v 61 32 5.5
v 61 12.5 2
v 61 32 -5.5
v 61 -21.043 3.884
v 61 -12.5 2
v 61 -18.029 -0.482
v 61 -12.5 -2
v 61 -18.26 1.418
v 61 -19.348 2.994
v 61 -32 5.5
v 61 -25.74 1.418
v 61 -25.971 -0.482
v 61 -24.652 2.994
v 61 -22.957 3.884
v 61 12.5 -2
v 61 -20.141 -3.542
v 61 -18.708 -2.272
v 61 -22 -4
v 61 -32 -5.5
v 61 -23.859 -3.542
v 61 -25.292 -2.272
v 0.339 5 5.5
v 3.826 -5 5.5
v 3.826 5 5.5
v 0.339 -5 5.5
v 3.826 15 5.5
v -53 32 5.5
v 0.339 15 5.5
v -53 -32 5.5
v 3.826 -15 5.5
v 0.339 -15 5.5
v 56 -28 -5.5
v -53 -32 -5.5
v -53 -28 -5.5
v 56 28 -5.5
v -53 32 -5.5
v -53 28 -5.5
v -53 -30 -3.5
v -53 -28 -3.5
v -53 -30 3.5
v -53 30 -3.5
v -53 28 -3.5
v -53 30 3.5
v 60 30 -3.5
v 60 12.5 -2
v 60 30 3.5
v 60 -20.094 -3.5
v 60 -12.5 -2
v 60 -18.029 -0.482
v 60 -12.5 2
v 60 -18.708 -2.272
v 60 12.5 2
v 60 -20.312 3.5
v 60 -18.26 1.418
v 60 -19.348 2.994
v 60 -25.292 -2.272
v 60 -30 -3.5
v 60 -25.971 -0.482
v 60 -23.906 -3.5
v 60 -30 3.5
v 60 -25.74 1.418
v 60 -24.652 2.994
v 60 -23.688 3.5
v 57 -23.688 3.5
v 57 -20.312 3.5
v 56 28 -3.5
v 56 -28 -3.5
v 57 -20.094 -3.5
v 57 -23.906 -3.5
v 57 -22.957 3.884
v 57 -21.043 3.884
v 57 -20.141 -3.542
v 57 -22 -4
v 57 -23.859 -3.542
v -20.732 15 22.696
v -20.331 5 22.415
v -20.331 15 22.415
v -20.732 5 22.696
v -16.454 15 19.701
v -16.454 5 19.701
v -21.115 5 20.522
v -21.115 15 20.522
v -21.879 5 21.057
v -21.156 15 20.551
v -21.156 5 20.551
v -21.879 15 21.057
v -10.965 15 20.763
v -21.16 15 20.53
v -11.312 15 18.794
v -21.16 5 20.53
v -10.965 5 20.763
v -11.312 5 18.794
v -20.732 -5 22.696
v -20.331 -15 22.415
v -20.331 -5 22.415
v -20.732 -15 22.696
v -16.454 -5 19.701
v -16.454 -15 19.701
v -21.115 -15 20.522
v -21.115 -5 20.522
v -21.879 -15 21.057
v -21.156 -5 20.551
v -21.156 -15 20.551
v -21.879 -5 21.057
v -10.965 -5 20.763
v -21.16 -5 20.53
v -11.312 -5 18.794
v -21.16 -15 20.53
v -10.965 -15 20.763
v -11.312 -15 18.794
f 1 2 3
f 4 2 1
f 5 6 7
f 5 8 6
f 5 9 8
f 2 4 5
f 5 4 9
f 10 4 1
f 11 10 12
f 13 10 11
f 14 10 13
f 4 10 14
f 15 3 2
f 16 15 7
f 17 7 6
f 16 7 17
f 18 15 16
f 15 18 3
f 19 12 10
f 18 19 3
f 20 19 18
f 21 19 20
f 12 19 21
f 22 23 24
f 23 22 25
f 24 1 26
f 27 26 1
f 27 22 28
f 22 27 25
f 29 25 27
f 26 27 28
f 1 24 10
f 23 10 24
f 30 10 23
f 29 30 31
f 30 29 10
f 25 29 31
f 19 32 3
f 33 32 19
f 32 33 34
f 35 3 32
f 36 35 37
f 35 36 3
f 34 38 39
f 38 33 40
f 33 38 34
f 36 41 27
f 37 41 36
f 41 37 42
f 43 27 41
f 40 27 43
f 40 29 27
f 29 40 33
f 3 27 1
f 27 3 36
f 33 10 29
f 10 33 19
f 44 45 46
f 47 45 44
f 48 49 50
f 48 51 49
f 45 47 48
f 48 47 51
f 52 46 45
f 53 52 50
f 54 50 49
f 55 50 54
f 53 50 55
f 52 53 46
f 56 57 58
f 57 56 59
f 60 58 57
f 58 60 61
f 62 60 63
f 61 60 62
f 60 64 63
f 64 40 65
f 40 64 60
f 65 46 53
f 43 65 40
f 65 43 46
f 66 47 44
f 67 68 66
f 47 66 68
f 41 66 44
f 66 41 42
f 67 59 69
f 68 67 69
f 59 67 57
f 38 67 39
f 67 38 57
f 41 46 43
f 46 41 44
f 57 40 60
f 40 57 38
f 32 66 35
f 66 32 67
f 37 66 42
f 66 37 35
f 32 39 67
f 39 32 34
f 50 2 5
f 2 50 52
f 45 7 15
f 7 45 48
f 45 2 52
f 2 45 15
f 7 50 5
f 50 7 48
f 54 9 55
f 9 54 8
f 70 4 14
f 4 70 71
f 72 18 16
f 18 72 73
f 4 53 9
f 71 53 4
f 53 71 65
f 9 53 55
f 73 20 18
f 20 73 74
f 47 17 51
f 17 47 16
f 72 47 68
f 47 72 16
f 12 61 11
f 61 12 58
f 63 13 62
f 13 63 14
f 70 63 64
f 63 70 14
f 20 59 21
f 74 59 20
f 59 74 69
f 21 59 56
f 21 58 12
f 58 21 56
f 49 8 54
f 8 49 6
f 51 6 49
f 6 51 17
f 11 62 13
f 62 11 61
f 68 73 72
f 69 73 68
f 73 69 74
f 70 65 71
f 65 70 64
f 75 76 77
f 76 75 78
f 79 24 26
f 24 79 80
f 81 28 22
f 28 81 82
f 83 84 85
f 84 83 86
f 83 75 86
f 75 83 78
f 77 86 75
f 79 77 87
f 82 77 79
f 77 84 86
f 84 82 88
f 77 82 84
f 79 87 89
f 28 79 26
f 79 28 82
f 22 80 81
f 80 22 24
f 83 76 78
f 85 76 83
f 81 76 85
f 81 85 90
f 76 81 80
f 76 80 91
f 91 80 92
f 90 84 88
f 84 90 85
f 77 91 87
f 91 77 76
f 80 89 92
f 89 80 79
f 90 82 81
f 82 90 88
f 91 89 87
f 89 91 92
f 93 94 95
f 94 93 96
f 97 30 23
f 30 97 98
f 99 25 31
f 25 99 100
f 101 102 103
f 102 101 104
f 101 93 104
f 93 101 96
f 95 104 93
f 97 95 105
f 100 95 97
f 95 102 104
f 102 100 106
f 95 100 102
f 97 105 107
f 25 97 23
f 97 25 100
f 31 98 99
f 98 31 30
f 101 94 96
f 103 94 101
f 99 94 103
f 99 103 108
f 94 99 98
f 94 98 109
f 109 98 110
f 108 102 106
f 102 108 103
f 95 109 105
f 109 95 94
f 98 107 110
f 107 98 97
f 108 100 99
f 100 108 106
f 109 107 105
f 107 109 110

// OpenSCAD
// [FL_INDEX: keywords="openscad, 3d_parametric, iPod_Touch_Holder_to_fix_in_the_air_conditioner_in_the_car, csg_solid" | COT="Parametric OpenSCAD design from 3DCodeverse"]
// Title: iPod Touch Holder to fix in the air conditioner in the car.

// variable description
thickness = 7; //[6:12]
height = 114; //[110:150]
angle = 35; //[20:60]


module case(){
	difference(){
		difference(){
			difference(){
				difference(){
					translate([4,0,0])cube([height,64,thickness+4],center=true);
					cube([height+6,60,thickness],center=true);
				}
				translate([-4,0,-5])cube([height+6,56,thickness+2],center=true);
			}	
			translate([height/2,0,0])cube([10,25,4],center=true);
		}
		translate([height/2,-22,0])rotate(a=[0,90,0])cylinder(h=8,r=4);
	}
}

module anchor(){
	union(){
		translate([-15,0,(thickness/2)+2.2])cube([30,10,2],center=true);
		translate([-25,0,(thickness/2)+4.2])rotate(a=[0,-25,0])cube([10,10,2],center=true);
	}
}

union(){
	case();
	translate([0,10,0])rotate([0,angle,0])anchor();
	translate([0,-10,0])rotate([0,angle,0])anchor();
}
